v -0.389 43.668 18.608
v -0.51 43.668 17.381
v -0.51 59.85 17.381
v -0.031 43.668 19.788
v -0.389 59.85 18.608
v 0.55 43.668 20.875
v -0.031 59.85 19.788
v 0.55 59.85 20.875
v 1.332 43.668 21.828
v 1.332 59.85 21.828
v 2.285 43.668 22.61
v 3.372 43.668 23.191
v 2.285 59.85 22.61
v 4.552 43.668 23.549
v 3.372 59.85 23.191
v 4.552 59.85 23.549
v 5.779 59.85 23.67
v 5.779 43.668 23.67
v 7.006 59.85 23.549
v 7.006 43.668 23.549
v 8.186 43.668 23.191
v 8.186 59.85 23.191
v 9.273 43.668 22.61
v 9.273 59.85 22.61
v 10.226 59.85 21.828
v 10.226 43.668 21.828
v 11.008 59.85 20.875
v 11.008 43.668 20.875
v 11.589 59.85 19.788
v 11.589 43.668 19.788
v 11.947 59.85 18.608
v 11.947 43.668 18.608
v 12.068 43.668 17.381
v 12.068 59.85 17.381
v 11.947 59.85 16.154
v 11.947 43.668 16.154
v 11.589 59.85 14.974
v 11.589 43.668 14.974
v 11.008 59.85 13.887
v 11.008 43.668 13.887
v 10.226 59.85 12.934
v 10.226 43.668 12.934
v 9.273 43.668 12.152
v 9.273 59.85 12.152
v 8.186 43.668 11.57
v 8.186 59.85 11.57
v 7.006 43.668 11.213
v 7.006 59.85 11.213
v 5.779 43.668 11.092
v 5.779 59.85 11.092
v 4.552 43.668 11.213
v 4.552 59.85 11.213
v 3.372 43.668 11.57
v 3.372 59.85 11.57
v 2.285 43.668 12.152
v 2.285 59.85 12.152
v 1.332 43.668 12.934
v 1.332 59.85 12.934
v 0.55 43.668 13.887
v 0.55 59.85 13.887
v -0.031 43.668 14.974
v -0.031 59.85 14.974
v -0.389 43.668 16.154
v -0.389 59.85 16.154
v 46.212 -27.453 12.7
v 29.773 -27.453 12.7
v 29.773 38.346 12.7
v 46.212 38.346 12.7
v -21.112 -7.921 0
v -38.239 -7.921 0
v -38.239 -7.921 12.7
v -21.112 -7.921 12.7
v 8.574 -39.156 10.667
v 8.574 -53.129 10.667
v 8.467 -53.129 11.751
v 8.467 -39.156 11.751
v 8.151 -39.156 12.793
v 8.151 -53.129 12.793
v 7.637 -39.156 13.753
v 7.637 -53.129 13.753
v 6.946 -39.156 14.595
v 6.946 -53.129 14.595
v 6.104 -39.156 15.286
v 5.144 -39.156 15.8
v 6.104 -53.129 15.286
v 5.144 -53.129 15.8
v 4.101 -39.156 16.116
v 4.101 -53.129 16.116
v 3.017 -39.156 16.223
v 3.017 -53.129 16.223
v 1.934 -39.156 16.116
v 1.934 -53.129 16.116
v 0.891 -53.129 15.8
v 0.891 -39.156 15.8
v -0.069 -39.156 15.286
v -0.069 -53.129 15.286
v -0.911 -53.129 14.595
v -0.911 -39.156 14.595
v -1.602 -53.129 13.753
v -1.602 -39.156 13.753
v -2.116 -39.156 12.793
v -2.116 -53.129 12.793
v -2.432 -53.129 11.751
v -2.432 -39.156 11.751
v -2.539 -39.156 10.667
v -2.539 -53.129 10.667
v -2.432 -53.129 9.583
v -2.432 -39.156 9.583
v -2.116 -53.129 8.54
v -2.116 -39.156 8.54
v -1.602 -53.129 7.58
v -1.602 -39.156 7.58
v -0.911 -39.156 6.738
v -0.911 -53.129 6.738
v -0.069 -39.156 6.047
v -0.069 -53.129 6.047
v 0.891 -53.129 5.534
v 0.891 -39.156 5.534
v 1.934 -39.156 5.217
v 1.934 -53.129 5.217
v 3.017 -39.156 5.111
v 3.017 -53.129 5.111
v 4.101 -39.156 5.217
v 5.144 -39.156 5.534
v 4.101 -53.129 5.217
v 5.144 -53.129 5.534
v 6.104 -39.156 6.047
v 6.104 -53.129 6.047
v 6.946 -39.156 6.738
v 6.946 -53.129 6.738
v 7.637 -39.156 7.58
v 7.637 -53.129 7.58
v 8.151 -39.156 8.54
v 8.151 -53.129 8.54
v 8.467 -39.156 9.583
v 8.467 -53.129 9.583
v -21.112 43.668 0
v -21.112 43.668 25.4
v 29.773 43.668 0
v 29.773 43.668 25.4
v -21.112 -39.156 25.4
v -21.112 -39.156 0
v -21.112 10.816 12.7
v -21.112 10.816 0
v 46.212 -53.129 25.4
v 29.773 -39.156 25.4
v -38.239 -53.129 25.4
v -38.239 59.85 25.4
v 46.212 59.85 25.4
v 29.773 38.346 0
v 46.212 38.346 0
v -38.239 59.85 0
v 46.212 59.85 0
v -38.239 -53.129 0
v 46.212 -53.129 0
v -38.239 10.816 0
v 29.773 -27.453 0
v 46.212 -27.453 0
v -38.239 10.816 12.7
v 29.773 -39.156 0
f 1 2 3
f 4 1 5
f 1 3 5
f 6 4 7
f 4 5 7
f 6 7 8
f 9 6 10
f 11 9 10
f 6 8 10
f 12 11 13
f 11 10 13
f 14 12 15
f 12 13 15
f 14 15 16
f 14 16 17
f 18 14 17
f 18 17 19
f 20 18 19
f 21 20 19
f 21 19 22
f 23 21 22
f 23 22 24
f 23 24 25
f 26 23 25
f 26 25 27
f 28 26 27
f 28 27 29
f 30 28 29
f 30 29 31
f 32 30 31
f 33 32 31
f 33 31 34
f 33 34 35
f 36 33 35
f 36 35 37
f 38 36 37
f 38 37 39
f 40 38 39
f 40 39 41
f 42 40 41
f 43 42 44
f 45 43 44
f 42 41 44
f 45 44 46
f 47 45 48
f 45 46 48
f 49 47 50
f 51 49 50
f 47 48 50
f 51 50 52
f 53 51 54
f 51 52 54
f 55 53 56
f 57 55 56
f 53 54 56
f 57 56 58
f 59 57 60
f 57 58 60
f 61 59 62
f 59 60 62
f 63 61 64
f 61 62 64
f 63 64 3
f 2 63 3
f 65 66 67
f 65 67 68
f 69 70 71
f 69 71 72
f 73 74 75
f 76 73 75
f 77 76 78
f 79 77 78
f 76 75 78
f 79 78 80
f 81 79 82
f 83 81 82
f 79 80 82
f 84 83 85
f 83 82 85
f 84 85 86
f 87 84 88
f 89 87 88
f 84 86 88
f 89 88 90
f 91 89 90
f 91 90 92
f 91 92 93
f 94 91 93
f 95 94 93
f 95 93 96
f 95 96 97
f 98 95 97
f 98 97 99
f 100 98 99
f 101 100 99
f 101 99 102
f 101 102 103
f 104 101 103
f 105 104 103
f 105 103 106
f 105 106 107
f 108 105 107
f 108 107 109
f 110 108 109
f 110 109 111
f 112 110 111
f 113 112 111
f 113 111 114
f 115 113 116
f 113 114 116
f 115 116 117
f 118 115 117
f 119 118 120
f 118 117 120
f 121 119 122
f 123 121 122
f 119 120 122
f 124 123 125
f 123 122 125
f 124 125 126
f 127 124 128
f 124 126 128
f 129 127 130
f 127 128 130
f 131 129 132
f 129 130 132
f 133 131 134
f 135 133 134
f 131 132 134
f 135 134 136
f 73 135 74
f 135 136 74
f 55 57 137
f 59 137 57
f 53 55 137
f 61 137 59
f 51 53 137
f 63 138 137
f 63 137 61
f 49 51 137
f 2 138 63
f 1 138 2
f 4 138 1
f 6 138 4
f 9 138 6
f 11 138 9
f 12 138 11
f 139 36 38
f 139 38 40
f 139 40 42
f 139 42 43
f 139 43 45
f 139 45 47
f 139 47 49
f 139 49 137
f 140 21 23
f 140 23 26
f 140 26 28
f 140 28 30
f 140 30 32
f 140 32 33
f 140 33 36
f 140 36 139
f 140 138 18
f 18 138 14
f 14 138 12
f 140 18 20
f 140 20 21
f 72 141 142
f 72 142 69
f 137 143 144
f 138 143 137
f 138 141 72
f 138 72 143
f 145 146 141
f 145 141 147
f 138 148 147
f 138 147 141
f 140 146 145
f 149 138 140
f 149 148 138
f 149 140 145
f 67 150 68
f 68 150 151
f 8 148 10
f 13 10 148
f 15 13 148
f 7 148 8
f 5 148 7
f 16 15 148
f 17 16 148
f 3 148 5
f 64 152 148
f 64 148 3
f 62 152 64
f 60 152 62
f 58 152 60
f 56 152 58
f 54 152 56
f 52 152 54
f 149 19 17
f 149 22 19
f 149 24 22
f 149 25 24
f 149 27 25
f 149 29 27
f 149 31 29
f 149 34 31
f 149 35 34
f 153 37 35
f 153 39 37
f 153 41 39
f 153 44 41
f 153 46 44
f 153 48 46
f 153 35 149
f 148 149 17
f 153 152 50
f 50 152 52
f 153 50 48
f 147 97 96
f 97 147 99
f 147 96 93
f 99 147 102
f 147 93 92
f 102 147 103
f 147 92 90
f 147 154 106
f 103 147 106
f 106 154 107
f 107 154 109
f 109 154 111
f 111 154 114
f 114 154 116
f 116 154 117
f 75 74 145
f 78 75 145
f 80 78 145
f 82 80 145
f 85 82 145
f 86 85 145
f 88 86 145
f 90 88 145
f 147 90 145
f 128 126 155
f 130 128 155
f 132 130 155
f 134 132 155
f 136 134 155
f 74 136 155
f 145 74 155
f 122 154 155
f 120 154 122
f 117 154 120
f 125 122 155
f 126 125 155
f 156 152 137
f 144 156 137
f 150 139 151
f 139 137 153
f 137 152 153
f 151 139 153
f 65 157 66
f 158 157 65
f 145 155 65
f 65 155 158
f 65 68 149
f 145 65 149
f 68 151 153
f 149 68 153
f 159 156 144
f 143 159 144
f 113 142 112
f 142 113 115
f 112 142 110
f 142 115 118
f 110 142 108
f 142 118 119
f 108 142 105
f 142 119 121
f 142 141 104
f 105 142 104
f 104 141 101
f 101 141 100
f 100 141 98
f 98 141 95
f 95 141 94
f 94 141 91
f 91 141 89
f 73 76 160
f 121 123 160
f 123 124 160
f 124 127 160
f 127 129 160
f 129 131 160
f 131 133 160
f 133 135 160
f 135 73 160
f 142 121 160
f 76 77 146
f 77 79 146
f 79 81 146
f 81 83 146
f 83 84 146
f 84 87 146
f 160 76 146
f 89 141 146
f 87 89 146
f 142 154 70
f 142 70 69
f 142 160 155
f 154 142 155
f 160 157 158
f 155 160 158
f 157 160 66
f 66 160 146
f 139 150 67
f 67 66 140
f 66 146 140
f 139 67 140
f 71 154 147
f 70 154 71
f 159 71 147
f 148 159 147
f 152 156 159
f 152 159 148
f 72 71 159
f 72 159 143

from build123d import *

# Parameters (mm, degrees)
F0_W      = 84.451213479
F0_H      = 112.9794791341
F1_DEPTH  = 25.4
F2_W      = 50.8853495121
F2_H      = 82.8240290284
F3_DEPTH  = 25.4
F4_R      = 6.2891485283
F5_DEPTH  = 25.4
F6_R      = 5.5560325186
F7_DEPTH  = 25.4
F8_W      = 17.1270668507
F8_H      = 18.73687841
F9_DEPTH  = 12.7
F10_W     = 16.4387971163
F10_H     = 65.7989624888
F11_DEPTH = 12.7


with BuildPart() as f1:
    # F0 (on Top) → F1 (new body)
    with BuildSketch(Plane.XY):
        with Locations((3.9865151048, 3.3602751791)):
            Rectangle(F0_W, F0_H)
    extrude(amount=F1_DEPTH)

    # F2 (on face) → F3 (cut)
    with BuildSketch(Plane.XY.offset(25.4)):
        with Locations((4.330649972, 2.2555477917)):
            Rectangle(F2_W, F2_H)
    extrude(amount=-F3_DEPTH, mode=Mode.SUBTRACT)

    # F4 (on face) → F5 (cut)
    with BuildSketch(Plane(origin=(0, 59.8500147462, 0), x_dir=(-1, 0, 0), z_dir=(0, 1, 0))):
        with Locations((-5.7790102437, 17.3808317631)):
            Circle(F4_R)
    extrude(amount=-F5_DEPTH, mode=Mode.SUBTRACT)

    # F6 (on face) → F7 (cut)
    with BuildSketch(Plane.XZ.offset(53.1294643879)):
        with Locations((3.0174842104, 10.6666553766)):
            Circle(F6_R)
    extrude(amount=-F7_DEPTH, mode=Mode.SUBTRACT)

    # F8 (on face) → F9 (cut)
    with BuildSketch(Plane(origin=(0, 0, 0), x_dir=(1, 0, 0), z_dir=(0, 0, -1))):
        with Locations((-29.6755582094, -1.4471039176)):
            Rectangle(F8_W, F8_H)
    extrude(amount=-F9_DEPTH, mode=Mode.SUBTRACT)

    # F10 (on face) → F11 (cut)
    with BuildSketch(Plane(origin=(0, 0, 0), x_dir=(1, 0, 0), z_dir=(0, 0, -1))):
        with Locations((37.9927232862, -5.4467311129)):
            Rectangle(F10_W, F10_H)
    extrude(amount=-F11_DEPTH, mode=Mode.SUBTRACT)


solid = f1.part
